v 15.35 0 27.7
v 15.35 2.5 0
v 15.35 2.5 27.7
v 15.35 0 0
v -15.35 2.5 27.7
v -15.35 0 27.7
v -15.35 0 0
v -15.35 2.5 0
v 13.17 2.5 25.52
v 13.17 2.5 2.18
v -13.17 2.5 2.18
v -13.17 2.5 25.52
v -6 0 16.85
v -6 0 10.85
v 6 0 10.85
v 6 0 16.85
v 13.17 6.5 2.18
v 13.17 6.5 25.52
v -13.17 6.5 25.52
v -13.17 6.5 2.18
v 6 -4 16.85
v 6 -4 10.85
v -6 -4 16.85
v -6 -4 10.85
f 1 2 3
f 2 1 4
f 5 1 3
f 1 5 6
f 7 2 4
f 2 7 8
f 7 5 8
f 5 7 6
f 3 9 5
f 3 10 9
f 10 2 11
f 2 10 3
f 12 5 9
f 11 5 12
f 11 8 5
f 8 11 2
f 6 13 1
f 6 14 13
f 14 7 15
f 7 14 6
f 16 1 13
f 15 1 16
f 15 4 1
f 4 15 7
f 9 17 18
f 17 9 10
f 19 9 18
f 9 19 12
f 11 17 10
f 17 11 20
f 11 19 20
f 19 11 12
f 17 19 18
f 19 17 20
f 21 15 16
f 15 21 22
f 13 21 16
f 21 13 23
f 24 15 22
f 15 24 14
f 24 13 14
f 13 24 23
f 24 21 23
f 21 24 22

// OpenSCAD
// file: params.scad
// params.scad — shared parameters for XIAO ESP32S3 Sense enclosure
// All dimensions in millimeters. Include this file in every part.
// See specs.md for rationale and modification guidance.

// ── BOARD: Seeed Studio XIAO ESP32S3 Sense ─────────────────────
// https://wiki.seeedstudio.com/xiao_esp32s3_getting_started/
// Main PCB: 21.0 × 17.5 mm; Sense expansion board clips to back,
// adding ~3 mm. Camera module on flex cable sits above PCB.
board_w    = 21.0;   // PCB width  (X in box coords)
board_l    = 18.0;   // PCB length (Y in box coords; 17.5 rounded up)
pcb_t      =  1.6;   // PCB thickness
comp_top   =  4.0;   // max component height above PCB (tallest cap)
comp_bot   =  3.5;   // total expansion board + bottom component height
cam_rise   =  5.5;   // camera module height above top components
// USB-C receptacle (centered on the +Y edge of the board)
usb_w      =  9.5;   // USB-C opening width
usb_h      =  3.8;   // USB-C opening height
usb_z_off  =  1.8;   // USB-C center height above PCB bottom face

// ── BOX ────────────────────────────────────────────────────────
wall       = 2.5;    // wall thickness (PETG min ~2 mm; 2.5 for rigidity)
cl         = 0.35;   // per-side clearance for board fit
// Interior cavity
ci_w  = board_w + 2*cl;
ci_l  = board_l + 2*cl;
// Split line at midpoint of PCB thickness (Z=0 in box coords)
ci_h_bot = comp_bot + pcb_t/2 + cl;  // below split
ci_h_top = pcb_t/2 + comp_top + cam_rise + cl;  // above split
// Outer box
box_w = ci_w + 2*wall;
box_l = ci_l + 2*wall;
box_h_bot = ci_h_bot + wall;   // height of lower half
box_h_top = ci_h_top + wall;   // height of upper half

// ── CAMERA HOLE (in top face of upper half) ──────────────────
cam_hole_d  = 9.0;   // lens aperture; OV2640 lens ~7 mm, extra for cable routing
cam_hole_xoff = 0;   // offset from box centerline (X); 0 = centered
cam_hole_yoff = 1.5; // offset toward USB end (adjust after test print)

// ── USB OPENING (in +Y face, centered on board edge) ─────────
usb_cut_w = usb_w + 1.0;  // clearance for plug
usb_cut_h = usb_h + 1.0;

// ── SNAP CLIPS (inside ±X walls, near −Y end) ────────────────
// Board slides in from −Y; clips on ±X inner walls engage the board edge.
clip_l     = 5.0;   // clip body length (Y direction)
clip_h     = pcb_t + 1.5;  // clip height spans PCB edge
clip_t     = 1.4;   // cantilever arm thickness (flex arm for PETG)
clip_land  = 1.2;   // notch ledge depth (captures board edge)
clip_y_pos = -ci_l/2 + clip_l/2 + 1.0;  // near back wall (−Y)

// ── DUST CAP (press-fit into −Y opening) ─────────────────────
cap_plug_t     = 4.0;    // depth of interference plug
cap_flange_t   = 2.5;    // flange plate thickness
cap_interf     = 0.18;   // press-fit interference per side (PETG flex)
cap_plug_w     = box_w - 2*cap_interf;  // slightly oversized → tight fit
cap_plug_l     = box_l - 2*cap_interf;
cap_flange_w   = box_w + 4.0;           // flange overhangs box by 2 mm each side
cap_flange_l   = box_l + 4.0;

// ── BALL JOINT ───────────────────────────────────────────────
ball_d    = 20.0;   // ball diameter; matches socket on box
ball_r    = ball_d / 2;
sock_wall = 3.5;    // socket shell thickness
// Socket wraps ~58% of sphere depth for retention without jamming.
// (50%+ is required for ball retention; 65%+ requires force to remove)
sock_depth = ball_r * 1.15;
sock_gap  = 1.4;    // clamp gap width; closes when M4 screw is tightened
// Clamping ear: tab extending from one X side, houses the M4 screw
ear_w     = 14.0;  // ear tab width (X direction)
ear_h     = 10.0;  // ear tab height (Z direction, from split line down)
clamp_screw_d = 4.5;   // M4 clearance through-hole (3.5 for M3)
clamp_nut_af  = 7.0;   // M4 nut across-flats
clamp_nut_h   = 3.2;   // M4 nut height (for nut-trap pocket)

// ── BOX JOIN SCREWS (M3, one per long side) ──────────────────
join_d    = 2.7;   // M3 clearance hole
join_boss = 5.5;   // boss OD
join_y    = ci_l / 4;  // Y position of bosses from center (±)

// ── ANTENNA CABLE GROOVE (on −Z face of lower half) ──────────
ant_w     = 4.0;   // groove width
ant_h     = 2.5;   // groove depth
// Positioned to one side of ball socket, routing toward −Y (T bracket)
ant_x_off = ball_r + sock_wall + 2.0;

// ── T-BASE ───────────────────────────────────────────────────
arm_w    = 80.0;   // crossbar total width
arm_d    = 22.0;   // crossbar depth (front-to-back)
arm_h    =  6.0;   // crossbar thickness
stem_w   = 24.0;   // stem width
stem_l   = 38.0;   // stem length (crossbar rear face to ball center)
stem_h   =  6.0;   // stem thickness (same as arm)
// Spax #8 wafer-head: major thread ≈ 4.2 mm, head ≈ 14 mm flat diameter.
// Wafer head sits flush on surface — no countersink needed.
mount_d  = 4.5;    // through-hole for #8 shank
mount_dx = 30.0;   // half-spacing between hole centers (holes at ±mount_dx)

// ── GLOBAL RENDER QUALITY ────────────────────────────────────
$fn = 64;   // set to 32 for fast preview, 128 for final STL export
// main file
// dust_cap.scad — press-fit flanged dust cap for the −Y (back) opening
//
// DESCRIPTION:
//   A flanged plug that covers the board-insertion opening of the assembled
//   box. The plug body has a slight interference fit with the inner cavity
//   walls; the flange prevents it from being pushed in too far.
//   Remove to access the USB-C port for programming without disassembling.
//
// PRINT ORIENTATION: flange face down (flat on bed). No supports needed.
// MATERIAL: PETG (flex allows repeated insertion/removal without cracking)
// FIT NOTE: if plug is too tight, sand the plug body or increase cap_interf
//           in params.scad (more negative = looser fit).

include <params.scad>

module dust_cap() {
    union() {
        // ── Flange (outer plate, sits against box −Y face) ─────
        translate([-cap_flange_w/2, 0, 0])
            cube([cap_flange_w, cap_flange_t, cap_flange_l]);

        // ── Press-fit plug (inserted into box inner cavity) ────
        // Dimensions are slightly oversized vs cavity for interference fit.
        // cap_interf is subtracted from each side in params (net: tighter).
        translate([-(cap_plug_w)/2, cap_flange_t, -(cap_plug_l)/2 + cap_flange_l/2])
            cube([cap_plug_w, cap_plug_t, cap_plug_l]);

        // ── Grip tab (pull tab on outside of flange) ───────────
        // Small tab on the outside makes the cap easy to remove by hand.
        translate([-6, -4, cap_flange_l/2 - 3])
            cube([12, 4, 6]);
    }
}

// Centered at origin, flange face at Y=0
dust_cap();
